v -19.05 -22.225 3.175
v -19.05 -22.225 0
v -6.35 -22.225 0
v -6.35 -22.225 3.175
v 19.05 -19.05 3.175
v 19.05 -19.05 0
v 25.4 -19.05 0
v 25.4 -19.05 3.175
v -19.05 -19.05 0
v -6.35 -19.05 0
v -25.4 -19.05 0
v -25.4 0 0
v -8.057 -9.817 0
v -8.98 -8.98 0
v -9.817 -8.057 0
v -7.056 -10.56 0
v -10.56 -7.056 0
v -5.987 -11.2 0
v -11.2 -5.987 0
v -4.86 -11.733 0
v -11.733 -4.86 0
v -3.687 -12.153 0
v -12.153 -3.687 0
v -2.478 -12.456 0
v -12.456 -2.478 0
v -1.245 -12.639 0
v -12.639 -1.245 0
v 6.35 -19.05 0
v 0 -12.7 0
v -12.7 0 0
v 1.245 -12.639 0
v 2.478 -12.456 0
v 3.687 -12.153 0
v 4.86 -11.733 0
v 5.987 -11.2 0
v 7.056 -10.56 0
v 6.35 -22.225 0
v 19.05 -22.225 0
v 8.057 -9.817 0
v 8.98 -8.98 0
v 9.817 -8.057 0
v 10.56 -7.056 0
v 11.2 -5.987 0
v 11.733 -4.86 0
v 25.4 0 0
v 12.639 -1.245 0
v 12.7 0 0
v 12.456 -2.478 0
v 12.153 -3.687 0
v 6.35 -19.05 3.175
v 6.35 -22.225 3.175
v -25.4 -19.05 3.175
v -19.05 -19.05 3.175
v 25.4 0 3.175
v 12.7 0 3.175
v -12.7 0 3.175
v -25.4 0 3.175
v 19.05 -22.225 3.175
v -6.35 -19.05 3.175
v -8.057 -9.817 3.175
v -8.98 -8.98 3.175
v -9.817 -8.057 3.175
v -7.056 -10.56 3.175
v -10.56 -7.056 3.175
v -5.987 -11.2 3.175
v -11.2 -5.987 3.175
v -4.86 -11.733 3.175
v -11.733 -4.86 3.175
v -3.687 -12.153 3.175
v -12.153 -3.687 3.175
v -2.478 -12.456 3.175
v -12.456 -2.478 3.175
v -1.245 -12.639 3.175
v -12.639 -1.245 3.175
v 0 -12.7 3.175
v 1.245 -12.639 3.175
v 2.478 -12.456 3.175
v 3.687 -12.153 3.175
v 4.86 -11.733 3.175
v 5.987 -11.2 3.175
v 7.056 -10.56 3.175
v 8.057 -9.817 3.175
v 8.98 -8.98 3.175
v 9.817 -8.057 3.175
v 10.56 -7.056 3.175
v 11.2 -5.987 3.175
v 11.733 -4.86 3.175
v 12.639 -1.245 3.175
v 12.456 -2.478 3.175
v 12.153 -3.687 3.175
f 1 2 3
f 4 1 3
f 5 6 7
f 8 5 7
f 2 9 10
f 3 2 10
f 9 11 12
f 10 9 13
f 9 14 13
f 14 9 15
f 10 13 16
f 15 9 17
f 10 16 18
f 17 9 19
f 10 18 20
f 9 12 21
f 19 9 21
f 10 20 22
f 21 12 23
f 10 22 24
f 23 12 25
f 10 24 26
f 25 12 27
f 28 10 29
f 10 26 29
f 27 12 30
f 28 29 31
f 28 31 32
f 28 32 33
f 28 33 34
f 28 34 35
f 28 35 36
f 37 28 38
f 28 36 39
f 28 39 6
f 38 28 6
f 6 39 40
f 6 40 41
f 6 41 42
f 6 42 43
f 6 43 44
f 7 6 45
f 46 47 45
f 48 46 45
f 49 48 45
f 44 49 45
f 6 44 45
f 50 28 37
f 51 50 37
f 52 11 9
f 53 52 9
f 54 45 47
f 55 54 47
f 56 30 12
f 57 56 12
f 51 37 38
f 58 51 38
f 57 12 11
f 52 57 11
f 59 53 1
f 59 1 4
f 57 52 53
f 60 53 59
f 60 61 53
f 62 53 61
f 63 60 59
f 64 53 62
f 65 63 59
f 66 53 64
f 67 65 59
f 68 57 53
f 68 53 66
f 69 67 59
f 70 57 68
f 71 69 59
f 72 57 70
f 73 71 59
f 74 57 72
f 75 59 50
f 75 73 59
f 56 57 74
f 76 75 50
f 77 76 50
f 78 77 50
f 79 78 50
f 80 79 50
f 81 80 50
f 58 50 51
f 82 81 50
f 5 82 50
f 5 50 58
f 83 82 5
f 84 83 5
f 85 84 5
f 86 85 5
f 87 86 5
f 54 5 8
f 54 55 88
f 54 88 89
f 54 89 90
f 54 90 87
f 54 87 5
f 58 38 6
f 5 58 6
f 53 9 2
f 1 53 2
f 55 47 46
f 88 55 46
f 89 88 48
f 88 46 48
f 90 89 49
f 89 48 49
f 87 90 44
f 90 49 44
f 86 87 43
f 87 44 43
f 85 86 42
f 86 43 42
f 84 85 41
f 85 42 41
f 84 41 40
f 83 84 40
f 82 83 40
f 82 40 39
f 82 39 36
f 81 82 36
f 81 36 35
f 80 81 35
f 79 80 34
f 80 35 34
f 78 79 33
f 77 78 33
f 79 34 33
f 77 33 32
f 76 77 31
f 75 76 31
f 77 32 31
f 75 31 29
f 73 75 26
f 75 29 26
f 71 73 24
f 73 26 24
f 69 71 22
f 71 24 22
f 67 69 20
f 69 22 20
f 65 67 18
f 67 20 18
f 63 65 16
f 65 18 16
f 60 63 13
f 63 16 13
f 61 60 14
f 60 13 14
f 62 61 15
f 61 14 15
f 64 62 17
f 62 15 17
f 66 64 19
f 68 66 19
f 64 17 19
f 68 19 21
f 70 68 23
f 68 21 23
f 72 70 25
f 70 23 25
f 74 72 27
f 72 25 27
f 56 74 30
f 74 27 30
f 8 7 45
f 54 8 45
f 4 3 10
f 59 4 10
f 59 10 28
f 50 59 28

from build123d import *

# Parameters (mm, degrees)
BOSS_EXTRUDE1_DEPTH = 3.175


with BuildPart() as part:
    # Sketch1 → Boss-Extrude1 (new body)
    with BuildSketch(Plane.XY):
        with BuildLine():
            Line((-12.7, 0), (-25.4, 0))
            Line((-25.4, 0), (-25.4, -19.05))
            Line((-25.4, -19.05), (-19.05, -19.05))
            Line((-19.05, -19.05), (-19.05, -22.225))
            Line((-19.05, -22.225), (-6.35, -22.225))
            Line((-6.35, -22.225), (-6.35, -19.05))
            Line((-6.35, -19.05), (6.35, -19.05))
            Line((6.35, -19.05), (6.35, -22.225))
            Line((6.35, -22.225), (19.05, -22.225))
            Line((19.05, -22.225), (19.05, -19.05))
            Line((19.05, -19.05), (25.4, -19.05))
            Line((25.4, -19.05), (25.4, 0))
            Line((25.4, 0), (12.7, 0))
            ThreePointArc((12.7, 0), (0, -12.7), (-12.7, 0))
        make_face()
    extrude(amount=BOSS_EXTRUDE1_DEPTH)


solid = part.part
